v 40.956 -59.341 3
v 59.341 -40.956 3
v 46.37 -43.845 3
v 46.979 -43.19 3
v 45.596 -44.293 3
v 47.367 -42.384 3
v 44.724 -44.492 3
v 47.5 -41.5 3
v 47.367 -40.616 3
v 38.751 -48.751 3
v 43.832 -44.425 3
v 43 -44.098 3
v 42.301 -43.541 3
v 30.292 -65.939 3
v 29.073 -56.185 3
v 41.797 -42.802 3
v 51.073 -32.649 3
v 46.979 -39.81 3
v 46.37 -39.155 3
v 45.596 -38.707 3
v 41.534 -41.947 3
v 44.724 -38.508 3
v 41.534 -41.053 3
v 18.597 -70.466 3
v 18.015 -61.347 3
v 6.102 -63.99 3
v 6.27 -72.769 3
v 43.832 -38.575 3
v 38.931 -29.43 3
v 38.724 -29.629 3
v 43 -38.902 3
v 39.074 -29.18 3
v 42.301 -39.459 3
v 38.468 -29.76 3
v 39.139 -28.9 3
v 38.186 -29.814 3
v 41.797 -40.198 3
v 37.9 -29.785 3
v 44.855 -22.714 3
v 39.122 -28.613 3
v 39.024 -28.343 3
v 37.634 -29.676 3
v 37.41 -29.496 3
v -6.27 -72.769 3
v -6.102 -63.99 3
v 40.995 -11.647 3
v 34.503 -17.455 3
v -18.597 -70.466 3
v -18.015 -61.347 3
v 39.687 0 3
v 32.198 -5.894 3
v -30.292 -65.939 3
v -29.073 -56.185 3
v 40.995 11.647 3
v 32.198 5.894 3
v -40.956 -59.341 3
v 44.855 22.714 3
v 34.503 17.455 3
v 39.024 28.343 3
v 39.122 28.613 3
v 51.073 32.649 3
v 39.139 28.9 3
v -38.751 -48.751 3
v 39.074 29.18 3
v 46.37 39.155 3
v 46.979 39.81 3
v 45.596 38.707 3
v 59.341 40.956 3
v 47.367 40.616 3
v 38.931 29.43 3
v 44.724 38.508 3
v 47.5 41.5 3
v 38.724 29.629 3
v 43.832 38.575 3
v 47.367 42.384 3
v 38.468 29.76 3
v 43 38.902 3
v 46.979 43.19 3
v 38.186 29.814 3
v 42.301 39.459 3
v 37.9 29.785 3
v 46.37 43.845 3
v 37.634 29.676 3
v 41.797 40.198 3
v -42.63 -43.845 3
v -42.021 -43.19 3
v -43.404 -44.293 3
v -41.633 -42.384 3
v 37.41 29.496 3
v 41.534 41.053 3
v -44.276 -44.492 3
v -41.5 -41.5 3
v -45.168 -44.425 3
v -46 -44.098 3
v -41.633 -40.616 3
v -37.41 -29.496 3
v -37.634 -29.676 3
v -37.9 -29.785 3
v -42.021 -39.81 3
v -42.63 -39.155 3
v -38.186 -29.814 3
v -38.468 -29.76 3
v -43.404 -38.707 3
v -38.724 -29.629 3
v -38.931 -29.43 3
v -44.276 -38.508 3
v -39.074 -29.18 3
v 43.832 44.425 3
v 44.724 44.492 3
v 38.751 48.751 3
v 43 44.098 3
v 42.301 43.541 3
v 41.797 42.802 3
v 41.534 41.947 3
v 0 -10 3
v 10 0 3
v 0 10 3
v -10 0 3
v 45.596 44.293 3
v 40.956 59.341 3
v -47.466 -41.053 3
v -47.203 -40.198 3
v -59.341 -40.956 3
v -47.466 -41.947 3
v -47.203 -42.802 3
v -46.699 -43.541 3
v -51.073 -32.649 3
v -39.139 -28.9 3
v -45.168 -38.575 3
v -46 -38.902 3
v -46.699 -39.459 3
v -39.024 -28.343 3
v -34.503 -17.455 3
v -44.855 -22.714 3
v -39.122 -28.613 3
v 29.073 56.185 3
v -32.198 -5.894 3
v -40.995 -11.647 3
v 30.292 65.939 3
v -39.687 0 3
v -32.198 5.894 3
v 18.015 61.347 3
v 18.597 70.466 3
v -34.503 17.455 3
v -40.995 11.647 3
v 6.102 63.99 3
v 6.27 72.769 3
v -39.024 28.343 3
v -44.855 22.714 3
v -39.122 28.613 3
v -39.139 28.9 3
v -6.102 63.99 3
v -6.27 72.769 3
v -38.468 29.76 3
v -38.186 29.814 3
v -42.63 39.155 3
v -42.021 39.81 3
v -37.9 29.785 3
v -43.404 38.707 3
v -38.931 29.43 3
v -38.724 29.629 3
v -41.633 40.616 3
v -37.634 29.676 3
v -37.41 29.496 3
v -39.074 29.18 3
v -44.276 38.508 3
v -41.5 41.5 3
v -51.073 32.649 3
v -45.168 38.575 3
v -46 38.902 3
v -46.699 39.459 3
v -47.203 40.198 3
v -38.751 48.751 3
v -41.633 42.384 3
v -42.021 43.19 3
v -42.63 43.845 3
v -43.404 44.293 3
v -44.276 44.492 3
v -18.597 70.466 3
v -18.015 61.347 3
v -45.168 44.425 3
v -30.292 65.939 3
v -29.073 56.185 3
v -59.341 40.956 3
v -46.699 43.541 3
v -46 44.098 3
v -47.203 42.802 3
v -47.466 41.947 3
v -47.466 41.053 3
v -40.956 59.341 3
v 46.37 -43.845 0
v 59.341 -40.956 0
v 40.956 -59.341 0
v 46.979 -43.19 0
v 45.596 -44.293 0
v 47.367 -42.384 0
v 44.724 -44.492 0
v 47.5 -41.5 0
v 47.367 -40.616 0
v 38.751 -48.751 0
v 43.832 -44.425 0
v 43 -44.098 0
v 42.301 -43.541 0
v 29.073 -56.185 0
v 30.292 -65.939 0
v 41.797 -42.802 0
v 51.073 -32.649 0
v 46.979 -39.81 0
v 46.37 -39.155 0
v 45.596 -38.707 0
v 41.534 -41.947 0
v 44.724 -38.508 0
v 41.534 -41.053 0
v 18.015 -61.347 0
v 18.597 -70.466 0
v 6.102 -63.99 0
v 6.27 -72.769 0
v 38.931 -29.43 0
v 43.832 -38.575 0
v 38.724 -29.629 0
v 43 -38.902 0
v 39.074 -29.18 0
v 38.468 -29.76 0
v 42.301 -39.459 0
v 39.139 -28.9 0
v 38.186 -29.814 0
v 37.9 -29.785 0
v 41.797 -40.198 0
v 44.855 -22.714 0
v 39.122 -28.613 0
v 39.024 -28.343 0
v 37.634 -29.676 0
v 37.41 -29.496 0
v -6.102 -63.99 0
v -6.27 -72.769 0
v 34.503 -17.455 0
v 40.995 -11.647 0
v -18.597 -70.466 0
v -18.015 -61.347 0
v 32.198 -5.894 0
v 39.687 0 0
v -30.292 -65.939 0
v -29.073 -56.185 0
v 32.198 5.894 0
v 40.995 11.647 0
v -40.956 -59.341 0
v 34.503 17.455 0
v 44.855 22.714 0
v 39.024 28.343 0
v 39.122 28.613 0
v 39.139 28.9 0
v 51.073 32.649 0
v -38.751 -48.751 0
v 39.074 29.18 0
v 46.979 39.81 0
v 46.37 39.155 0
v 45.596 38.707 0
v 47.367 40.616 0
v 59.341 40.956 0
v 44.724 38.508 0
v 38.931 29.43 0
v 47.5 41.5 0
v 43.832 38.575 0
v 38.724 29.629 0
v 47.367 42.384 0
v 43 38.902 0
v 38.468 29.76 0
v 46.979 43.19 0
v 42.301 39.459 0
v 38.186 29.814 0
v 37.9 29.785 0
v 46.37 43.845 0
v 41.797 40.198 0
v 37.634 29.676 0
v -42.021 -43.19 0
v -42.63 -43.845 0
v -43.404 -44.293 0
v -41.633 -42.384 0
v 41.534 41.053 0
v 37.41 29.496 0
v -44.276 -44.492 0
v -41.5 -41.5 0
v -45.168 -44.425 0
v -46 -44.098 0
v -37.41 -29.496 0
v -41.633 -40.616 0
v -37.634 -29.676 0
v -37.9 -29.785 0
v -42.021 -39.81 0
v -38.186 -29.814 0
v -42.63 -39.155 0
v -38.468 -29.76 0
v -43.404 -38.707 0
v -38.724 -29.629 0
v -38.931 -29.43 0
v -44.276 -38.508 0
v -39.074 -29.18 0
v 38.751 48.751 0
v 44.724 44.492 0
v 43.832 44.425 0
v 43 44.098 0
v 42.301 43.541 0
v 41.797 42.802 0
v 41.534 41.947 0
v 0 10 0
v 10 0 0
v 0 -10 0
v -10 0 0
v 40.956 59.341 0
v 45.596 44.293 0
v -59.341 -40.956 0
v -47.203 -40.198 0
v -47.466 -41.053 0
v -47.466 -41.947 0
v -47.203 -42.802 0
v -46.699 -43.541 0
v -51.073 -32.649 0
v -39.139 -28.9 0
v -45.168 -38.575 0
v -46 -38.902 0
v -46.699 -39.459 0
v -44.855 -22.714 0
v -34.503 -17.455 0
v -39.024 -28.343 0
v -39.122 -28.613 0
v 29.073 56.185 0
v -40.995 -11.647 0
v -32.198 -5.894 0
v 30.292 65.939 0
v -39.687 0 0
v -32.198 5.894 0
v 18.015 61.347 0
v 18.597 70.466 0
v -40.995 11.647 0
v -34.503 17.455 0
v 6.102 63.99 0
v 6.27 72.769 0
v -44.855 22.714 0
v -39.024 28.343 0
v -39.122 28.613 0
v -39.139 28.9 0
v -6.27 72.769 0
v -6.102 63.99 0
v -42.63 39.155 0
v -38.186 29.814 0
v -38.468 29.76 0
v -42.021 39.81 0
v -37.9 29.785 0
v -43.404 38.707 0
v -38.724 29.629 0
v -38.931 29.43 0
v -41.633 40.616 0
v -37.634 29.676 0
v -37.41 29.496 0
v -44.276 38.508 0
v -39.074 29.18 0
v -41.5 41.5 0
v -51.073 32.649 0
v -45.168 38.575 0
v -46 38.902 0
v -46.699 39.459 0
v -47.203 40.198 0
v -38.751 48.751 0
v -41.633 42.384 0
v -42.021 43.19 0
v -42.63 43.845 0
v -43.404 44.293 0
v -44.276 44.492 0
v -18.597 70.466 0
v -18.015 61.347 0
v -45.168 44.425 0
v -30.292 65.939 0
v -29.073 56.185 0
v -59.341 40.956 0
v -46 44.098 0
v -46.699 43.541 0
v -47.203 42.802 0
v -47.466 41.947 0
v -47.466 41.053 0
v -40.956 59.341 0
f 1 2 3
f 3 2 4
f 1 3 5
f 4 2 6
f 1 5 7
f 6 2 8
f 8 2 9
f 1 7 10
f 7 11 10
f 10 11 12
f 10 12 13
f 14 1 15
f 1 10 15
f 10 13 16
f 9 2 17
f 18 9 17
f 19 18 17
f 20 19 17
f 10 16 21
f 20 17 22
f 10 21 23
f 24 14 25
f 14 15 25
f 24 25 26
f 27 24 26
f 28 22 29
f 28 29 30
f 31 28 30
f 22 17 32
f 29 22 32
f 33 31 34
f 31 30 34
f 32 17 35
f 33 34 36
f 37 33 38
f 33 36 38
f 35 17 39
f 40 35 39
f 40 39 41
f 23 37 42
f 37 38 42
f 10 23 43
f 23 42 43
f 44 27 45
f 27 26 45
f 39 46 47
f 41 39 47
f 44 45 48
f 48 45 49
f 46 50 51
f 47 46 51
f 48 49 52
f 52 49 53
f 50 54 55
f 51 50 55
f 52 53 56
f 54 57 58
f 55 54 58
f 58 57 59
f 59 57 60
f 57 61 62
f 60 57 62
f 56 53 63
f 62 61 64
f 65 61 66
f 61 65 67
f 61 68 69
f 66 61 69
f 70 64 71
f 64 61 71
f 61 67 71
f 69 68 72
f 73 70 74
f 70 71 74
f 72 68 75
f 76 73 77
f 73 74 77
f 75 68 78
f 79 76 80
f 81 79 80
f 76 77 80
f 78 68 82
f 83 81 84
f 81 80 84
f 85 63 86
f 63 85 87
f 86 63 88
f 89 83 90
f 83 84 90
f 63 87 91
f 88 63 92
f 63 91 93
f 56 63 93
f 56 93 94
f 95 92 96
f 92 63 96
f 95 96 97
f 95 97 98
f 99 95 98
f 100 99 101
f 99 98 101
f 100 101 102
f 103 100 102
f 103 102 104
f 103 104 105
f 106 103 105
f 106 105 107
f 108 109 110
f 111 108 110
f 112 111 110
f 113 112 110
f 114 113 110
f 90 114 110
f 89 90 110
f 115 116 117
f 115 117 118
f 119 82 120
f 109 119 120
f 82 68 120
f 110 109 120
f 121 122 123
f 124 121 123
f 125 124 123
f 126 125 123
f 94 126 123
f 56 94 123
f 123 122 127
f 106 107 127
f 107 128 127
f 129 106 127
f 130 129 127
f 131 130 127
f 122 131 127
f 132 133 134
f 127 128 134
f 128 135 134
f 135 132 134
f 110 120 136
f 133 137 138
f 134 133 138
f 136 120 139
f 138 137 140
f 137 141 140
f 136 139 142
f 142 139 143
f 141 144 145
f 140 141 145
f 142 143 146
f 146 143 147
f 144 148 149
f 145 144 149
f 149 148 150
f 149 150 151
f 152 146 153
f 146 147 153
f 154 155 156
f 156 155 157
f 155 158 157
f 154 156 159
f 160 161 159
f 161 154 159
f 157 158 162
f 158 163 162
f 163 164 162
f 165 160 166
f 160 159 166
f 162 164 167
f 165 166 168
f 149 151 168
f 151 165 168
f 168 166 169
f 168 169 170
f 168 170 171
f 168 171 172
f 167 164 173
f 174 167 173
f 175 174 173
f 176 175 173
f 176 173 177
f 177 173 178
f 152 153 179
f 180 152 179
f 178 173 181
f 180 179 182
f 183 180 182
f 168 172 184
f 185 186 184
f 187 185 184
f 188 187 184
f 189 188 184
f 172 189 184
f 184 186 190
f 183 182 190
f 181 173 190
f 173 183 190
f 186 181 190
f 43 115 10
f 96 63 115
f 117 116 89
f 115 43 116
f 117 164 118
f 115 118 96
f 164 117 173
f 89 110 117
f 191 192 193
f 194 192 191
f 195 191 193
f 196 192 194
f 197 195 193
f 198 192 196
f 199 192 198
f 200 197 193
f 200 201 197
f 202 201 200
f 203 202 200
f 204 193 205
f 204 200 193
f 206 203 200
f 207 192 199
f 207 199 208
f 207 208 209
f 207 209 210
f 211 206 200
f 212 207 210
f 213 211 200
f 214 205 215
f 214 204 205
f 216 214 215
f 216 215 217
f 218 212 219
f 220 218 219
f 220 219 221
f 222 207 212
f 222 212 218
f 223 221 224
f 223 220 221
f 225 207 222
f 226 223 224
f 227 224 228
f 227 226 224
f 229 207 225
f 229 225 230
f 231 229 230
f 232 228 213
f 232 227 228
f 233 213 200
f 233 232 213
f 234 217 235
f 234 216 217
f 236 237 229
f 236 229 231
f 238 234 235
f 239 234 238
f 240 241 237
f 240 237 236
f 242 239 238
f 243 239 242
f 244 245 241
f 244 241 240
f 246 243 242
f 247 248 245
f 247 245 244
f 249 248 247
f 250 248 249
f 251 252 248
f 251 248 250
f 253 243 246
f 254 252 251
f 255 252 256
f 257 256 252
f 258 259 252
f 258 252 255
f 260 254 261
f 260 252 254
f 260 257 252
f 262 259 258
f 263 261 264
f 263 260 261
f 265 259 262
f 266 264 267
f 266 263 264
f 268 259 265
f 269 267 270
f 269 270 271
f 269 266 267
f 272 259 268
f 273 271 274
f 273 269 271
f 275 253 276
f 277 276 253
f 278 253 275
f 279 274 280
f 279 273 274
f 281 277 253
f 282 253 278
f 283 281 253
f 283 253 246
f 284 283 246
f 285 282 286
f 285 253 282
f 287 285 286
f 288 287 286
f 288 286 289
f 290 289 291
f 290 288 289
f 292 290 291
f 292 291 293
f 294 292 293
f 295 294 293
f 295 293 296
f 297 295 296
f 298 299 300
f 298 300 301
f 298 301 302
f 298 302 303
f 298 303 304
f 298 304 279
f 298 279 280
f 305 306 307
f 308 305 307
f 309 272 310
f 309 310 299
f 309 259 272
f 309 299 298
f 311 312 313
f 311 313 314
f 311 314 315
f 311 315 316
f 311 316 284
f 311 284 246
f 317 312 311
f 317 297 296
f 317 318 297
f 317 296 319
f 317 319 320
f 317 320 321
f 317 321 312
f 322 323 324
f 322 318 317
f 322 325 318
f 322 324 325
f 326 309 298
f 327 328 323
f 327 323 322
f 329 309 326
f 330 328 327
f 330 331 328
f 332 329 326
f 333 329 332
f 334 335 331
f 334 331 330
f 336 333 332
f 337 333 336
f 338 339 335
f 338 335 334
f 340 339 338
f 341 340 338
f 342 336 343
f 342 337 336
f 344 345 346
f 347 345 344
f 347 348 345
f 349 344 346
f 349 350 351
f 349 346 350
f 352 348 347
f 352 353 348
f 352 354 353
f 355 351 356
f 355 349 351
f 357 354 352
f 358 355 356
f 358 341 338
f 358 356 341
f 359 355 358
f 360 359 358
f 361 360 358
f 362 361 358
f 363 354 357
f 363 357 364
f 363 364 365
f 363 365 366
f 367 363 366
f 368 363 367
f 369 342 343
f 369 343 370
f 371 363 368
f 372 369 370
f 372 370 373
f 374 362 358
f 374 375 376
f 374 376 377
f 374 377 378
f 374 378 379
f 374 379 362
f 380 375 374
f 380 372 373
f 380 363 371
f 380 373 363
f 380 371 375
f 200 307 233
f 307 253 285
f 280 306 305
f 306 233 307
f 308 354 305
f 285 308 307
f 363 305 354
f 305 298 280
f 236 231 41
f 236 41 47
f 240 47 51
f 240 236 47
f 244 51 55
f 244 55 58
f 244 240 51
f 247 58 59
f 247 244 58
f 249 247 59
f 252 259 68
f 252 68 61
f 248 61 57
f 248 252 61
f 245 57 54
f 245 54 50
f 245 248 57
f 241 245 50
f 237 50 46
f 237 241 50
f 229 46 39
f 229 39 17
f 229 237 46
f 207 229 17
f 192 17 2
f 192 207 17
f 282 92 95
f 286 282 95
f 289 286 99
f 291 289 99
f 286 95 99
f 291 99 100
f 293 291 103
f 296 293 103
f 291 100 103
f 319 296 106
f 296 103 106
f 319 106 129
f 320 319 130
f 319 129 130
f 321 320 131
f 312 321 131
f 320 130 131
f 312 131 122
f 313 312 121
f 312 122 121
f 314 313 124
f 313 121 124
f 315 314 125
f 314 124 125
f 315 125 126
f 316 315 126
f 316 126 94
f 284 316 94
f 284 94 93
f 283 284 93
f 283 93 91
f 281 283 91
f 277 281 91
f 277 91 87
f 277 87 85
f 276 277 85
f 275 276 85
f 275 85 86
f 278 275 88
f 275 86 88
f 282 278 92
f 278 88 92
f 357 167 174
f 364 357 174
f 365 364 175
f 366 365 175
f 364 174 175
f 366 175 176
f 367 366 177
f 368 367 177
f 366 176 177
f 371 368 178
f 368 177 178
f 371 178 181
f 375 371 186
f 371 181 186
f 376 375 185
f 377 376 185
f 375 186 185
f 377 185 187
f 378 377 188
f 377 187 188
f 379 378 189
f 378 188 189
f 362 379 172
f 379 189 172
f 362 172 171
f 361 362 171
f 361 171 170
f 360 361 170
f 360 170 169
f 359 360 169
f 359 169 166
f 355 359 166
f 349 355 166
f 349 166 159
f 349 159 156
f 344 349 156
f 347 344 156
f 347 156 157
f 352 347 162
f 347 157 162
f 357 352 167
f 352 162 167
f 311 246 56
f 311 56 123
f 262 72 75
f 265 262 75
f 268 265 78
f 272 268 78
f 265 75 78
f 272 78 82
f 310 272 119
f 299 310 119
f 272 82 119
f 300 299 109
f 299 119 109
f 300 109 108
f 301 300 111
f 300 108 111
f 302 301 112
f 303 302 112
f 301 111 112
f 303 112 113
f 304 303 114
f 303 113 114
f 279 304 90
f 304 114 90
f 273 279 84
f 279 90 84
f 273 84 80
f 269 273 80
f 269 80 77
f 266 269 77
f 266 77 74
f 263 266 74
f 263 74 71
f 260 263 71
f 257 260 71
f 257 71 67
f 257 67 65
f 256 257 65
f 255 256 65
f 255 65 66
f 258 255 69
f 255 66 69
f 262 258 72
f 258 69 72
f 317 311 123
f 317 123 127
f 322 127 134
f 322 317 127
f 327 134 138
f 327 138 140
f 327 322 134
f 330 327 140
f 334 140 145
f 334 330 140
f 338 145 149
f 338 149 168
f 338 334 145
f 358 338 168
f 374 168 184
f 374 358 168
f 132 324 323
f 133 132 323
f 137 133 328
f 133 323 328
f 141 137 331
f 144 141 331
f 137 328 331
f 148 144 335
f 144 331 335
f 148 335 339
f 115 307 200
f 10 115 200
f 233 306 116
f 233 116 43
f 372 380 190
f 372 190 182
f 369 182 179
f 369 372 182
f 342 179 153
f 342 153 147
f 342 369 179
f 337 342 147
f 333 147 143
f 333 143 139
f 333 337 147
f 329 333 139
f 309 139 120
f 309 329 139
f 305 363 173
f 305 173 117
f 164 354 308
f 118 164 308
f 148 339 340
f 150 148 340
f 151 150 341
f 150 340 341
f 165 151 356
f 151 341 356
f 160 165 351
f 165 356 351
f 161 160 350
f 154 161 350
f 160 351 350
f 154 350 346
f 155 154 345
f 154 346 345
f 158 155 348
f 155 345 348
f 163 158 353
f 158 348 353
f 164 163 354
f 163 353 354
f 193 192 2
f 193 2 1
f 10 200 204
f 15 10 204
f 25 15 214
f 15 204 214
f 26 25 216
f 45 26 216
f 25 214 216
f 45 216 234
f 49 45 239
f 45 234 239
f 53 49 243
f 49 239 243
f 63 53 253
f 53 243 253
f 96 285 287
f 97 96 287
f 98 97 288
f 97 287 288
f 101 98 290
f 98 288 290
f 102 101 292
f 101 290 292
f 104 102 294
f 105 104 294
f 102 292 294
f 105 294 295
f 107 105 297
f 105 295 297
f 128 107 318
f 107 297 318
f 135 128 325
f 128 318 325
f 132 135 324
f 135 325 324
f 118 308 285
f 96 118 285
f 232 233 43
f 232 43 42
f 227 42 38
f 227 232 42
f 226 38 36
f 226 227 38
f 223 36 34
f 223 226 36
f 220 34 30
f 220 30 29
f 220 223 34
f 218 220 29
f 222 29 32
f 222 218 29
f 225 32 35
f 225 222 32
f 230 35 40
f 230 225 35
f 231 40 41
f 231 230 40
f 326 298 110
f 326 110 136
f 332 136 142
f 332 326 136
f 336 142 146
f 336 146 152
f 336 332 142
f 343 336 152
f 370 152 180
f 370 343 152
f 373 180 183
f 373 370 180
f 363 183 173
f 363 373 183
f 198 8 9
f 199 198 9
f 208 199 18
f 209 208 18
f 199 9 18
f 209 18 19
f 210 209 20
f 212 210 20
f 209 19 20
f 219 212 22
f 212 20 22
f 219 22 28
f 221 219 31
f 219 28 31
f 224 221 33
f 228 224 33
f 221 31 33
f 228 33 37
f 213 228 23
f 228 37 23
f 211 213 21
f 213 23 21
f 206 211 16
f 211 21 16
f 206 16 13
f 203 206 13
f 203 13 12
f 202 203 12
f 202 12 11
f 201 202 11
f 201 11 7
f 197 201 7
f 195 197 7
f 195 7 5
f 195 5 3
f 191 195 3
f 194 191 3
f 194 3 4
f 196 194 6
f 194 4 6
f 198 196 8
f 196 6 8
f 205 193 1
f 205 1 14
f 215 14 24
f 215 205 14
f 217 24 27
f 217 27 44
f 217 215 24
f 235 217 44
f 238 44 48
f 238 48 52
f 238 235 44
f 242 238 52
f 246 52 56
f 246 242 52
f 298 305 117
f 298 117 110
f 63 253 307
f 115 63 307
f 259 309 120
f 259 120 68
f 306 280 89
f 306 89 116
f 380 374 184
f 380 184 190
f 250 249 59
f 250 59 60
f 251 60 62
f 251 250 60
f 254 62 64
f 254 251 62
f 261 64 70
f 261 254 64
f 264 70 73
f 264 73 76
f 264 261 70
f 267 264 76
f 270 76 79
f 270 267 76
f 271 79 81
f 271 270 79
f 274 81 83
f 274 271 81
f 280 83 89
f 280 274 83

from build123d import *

# Parameters (mm, degrees)
SKETCH1_R             = 5
BOSS_EXTRUDE1_DEPTH   = 0.1
BOSS_EXTRUDE1_2_DEPTH = 0.1
BOSS_EXTRUDE1_3_DEPTH = 0.1
BOSS_EXTRUDE1_4_DEPTH = 0.1
BOSS_EXTRUDE2_DEPTH   = 3
SKETCH3_R             = 3
CUT_EXTRUDE1_DEPTH    = 3


with BuildPart() as part:
    # Sketch1 → Boss-Extrude1 (new body)
    with BuildSketch(Plane.XY):
        with Locations((-44.491847198, 44.491847198)):
            Circle(SKETCH1_R)
    extrude(amount=BOSS_EXTRUDE1_DEPTH)



with BuildPart() as body_2:
    # Sketch1 → Boss-Extrude1 2 (new body)
    with BuildSketch(Plane.XY):
        with Locations((44.491847198, 44.491847198)):
            Circle(SKETCH1_R)
    extrude(amount=BOSS_EXTRUDE1_2_DEPTH)


with BuildPart() as body_3:
    # Sketch1 → Boss-Extrude1 3 (new body)
    with BuildSketch(Plane.XY):
        with Locations((44.491847198, -44.491847198)):
            Circle(SKETCH1_R)
    extrude(amount=BOSS_EXTRUDE1_3_DEPTH)


with BuildPart() as body_4:
    # Sketch1 → Boss-Extrude1 4 (new body)
    with BuildSketch(Plane.XY):
        with Locations((-44.491847198, -44.491847198)):
            Circle(SKETCH1_R)
    extrude(amount=BOSS_EXTRUDE1_4_DEPTH)


with BuildPart() as part_1:
    add(part.part)

    add(body_2.part)  # Boss-Extrude2 merges body 2

    add(body_3.part)  # Boss-Extrude2 merges body 3

    add(body_4.part)  # Boss-Extrude2 merges body 4
    # Sketch2 → Boss-Extrude2 (add)
    with BuildSketch(Plane.XY):
        with BuildLine():
            Line((-59.341089603, 40.956313292), (-40.956313292, 59.341089603))
            ThreePointArc((-40.956313292, 59.341089603), (0, 73.058676231), (40.956313292, 59.341089603))
            Line((40.956313292, 59.341089603), (59.341089603, 40.956313292))
            ThreePointArc((59.341089603, 40.956313292), (39.686643359, 0), (59.341089603, -40.956313292))
            Line((59.341089603, -40.956313292), (40.956313292, -59.341089603))
            ThreePointArc((40.956313292, -59.341089603), (0, -73.058676231), (-40.956313292, -59.341089603))
            Line((-40.956313292, -59.341089603), (-59.341089603, -40.956313292))
            ThreePointArc((-59.341089603, -40.956313292), (-39.686643359, 0), (-59.341089603, 40.956313292))
        make_face()
        with BuildLine():
            Line((-38.750824491, 48.750824491), (0, 10))
            Line((0, 10), (38.750824491, 48.750824491))
            ThreePointArc((38.750824491, 48.750824491), (0, 64.323437718), (-38.750824491, 48.750824491))
        make_face(mode=Mode.SUBTRACT)
        with BuildLine():
            Line((-37.410135101, 29.495739933), (-10, 0))
            Line((-10, 0), (-37.410135101, -29.495739933))
            ThreePointArc((-37.410135101, -29.495739933), (-38.724006049, -29.628666123), (-39.024062115, -28.342628566))
            ThreePointArc((-39.024062115, -28.342628566), (-31.907853639, 0), (-39.024062115, 28.342628566))
            ThreePointArc((-39.024062115, 28.342628566), (-38.724006049, 29.628666123), (-37.410135101, 29.495739933))
        make_face(mode=Mode.SUBTRACT)
        with BuildLine():
            Line((10, 0), (37.410135101, -29.495739933))
            ThreePointArc((37.410135101, -29.495739933), (38.724006049, -29.628666123), (39.024062115, -28.342628566))
            ThreePointArc((39.024062115, -28.342628566), (31.907853639, 0), (39.024062115, 28.342628566))
            ThreePointArc((39.024062115, 28.342628566), (38.724006049, 29.628666123), (37.410135101, 29.495739933))
            Line((37.410135101, 29.495739933), (10, 0))
        make_face(mode=Mode.SUBTRACT)
        with BuildLine():
            Line((0, -10), (38.750824491, -48.750824491))
            ThreePointArc((38.750824491, -48.750824491), (0, -64.323437718), (-38.750824491, -48.750824491))
            Line((-38.750824491, -48.750824491), (0, -10))
        make_face(mode=Mode.SUBTRACT)
    extrude(amount=BOSS_EXTRUDE2_DEPTH)

    # Sketch3 → Cut-Extrude1 (cut)
    with BuildSketch(Plane.XY.offset(3)):
        with Locations((-44.5, -41.5)):
            Circle(SKETCH3_R)
        with Locations((44.5, -41.5)):
            Circle(SKETCH3_R)
        with Locations((44.5, 41.5)):
            Circle(SKETCH3_R)
        with Locations((-44.5, 41.5)):
            Circle(SKETCH3_R)
    extrude(amount=-CUT_EXTRUDE1_DEPTH, mode=Mode.SUBTRACT)


solid = part_1.part
